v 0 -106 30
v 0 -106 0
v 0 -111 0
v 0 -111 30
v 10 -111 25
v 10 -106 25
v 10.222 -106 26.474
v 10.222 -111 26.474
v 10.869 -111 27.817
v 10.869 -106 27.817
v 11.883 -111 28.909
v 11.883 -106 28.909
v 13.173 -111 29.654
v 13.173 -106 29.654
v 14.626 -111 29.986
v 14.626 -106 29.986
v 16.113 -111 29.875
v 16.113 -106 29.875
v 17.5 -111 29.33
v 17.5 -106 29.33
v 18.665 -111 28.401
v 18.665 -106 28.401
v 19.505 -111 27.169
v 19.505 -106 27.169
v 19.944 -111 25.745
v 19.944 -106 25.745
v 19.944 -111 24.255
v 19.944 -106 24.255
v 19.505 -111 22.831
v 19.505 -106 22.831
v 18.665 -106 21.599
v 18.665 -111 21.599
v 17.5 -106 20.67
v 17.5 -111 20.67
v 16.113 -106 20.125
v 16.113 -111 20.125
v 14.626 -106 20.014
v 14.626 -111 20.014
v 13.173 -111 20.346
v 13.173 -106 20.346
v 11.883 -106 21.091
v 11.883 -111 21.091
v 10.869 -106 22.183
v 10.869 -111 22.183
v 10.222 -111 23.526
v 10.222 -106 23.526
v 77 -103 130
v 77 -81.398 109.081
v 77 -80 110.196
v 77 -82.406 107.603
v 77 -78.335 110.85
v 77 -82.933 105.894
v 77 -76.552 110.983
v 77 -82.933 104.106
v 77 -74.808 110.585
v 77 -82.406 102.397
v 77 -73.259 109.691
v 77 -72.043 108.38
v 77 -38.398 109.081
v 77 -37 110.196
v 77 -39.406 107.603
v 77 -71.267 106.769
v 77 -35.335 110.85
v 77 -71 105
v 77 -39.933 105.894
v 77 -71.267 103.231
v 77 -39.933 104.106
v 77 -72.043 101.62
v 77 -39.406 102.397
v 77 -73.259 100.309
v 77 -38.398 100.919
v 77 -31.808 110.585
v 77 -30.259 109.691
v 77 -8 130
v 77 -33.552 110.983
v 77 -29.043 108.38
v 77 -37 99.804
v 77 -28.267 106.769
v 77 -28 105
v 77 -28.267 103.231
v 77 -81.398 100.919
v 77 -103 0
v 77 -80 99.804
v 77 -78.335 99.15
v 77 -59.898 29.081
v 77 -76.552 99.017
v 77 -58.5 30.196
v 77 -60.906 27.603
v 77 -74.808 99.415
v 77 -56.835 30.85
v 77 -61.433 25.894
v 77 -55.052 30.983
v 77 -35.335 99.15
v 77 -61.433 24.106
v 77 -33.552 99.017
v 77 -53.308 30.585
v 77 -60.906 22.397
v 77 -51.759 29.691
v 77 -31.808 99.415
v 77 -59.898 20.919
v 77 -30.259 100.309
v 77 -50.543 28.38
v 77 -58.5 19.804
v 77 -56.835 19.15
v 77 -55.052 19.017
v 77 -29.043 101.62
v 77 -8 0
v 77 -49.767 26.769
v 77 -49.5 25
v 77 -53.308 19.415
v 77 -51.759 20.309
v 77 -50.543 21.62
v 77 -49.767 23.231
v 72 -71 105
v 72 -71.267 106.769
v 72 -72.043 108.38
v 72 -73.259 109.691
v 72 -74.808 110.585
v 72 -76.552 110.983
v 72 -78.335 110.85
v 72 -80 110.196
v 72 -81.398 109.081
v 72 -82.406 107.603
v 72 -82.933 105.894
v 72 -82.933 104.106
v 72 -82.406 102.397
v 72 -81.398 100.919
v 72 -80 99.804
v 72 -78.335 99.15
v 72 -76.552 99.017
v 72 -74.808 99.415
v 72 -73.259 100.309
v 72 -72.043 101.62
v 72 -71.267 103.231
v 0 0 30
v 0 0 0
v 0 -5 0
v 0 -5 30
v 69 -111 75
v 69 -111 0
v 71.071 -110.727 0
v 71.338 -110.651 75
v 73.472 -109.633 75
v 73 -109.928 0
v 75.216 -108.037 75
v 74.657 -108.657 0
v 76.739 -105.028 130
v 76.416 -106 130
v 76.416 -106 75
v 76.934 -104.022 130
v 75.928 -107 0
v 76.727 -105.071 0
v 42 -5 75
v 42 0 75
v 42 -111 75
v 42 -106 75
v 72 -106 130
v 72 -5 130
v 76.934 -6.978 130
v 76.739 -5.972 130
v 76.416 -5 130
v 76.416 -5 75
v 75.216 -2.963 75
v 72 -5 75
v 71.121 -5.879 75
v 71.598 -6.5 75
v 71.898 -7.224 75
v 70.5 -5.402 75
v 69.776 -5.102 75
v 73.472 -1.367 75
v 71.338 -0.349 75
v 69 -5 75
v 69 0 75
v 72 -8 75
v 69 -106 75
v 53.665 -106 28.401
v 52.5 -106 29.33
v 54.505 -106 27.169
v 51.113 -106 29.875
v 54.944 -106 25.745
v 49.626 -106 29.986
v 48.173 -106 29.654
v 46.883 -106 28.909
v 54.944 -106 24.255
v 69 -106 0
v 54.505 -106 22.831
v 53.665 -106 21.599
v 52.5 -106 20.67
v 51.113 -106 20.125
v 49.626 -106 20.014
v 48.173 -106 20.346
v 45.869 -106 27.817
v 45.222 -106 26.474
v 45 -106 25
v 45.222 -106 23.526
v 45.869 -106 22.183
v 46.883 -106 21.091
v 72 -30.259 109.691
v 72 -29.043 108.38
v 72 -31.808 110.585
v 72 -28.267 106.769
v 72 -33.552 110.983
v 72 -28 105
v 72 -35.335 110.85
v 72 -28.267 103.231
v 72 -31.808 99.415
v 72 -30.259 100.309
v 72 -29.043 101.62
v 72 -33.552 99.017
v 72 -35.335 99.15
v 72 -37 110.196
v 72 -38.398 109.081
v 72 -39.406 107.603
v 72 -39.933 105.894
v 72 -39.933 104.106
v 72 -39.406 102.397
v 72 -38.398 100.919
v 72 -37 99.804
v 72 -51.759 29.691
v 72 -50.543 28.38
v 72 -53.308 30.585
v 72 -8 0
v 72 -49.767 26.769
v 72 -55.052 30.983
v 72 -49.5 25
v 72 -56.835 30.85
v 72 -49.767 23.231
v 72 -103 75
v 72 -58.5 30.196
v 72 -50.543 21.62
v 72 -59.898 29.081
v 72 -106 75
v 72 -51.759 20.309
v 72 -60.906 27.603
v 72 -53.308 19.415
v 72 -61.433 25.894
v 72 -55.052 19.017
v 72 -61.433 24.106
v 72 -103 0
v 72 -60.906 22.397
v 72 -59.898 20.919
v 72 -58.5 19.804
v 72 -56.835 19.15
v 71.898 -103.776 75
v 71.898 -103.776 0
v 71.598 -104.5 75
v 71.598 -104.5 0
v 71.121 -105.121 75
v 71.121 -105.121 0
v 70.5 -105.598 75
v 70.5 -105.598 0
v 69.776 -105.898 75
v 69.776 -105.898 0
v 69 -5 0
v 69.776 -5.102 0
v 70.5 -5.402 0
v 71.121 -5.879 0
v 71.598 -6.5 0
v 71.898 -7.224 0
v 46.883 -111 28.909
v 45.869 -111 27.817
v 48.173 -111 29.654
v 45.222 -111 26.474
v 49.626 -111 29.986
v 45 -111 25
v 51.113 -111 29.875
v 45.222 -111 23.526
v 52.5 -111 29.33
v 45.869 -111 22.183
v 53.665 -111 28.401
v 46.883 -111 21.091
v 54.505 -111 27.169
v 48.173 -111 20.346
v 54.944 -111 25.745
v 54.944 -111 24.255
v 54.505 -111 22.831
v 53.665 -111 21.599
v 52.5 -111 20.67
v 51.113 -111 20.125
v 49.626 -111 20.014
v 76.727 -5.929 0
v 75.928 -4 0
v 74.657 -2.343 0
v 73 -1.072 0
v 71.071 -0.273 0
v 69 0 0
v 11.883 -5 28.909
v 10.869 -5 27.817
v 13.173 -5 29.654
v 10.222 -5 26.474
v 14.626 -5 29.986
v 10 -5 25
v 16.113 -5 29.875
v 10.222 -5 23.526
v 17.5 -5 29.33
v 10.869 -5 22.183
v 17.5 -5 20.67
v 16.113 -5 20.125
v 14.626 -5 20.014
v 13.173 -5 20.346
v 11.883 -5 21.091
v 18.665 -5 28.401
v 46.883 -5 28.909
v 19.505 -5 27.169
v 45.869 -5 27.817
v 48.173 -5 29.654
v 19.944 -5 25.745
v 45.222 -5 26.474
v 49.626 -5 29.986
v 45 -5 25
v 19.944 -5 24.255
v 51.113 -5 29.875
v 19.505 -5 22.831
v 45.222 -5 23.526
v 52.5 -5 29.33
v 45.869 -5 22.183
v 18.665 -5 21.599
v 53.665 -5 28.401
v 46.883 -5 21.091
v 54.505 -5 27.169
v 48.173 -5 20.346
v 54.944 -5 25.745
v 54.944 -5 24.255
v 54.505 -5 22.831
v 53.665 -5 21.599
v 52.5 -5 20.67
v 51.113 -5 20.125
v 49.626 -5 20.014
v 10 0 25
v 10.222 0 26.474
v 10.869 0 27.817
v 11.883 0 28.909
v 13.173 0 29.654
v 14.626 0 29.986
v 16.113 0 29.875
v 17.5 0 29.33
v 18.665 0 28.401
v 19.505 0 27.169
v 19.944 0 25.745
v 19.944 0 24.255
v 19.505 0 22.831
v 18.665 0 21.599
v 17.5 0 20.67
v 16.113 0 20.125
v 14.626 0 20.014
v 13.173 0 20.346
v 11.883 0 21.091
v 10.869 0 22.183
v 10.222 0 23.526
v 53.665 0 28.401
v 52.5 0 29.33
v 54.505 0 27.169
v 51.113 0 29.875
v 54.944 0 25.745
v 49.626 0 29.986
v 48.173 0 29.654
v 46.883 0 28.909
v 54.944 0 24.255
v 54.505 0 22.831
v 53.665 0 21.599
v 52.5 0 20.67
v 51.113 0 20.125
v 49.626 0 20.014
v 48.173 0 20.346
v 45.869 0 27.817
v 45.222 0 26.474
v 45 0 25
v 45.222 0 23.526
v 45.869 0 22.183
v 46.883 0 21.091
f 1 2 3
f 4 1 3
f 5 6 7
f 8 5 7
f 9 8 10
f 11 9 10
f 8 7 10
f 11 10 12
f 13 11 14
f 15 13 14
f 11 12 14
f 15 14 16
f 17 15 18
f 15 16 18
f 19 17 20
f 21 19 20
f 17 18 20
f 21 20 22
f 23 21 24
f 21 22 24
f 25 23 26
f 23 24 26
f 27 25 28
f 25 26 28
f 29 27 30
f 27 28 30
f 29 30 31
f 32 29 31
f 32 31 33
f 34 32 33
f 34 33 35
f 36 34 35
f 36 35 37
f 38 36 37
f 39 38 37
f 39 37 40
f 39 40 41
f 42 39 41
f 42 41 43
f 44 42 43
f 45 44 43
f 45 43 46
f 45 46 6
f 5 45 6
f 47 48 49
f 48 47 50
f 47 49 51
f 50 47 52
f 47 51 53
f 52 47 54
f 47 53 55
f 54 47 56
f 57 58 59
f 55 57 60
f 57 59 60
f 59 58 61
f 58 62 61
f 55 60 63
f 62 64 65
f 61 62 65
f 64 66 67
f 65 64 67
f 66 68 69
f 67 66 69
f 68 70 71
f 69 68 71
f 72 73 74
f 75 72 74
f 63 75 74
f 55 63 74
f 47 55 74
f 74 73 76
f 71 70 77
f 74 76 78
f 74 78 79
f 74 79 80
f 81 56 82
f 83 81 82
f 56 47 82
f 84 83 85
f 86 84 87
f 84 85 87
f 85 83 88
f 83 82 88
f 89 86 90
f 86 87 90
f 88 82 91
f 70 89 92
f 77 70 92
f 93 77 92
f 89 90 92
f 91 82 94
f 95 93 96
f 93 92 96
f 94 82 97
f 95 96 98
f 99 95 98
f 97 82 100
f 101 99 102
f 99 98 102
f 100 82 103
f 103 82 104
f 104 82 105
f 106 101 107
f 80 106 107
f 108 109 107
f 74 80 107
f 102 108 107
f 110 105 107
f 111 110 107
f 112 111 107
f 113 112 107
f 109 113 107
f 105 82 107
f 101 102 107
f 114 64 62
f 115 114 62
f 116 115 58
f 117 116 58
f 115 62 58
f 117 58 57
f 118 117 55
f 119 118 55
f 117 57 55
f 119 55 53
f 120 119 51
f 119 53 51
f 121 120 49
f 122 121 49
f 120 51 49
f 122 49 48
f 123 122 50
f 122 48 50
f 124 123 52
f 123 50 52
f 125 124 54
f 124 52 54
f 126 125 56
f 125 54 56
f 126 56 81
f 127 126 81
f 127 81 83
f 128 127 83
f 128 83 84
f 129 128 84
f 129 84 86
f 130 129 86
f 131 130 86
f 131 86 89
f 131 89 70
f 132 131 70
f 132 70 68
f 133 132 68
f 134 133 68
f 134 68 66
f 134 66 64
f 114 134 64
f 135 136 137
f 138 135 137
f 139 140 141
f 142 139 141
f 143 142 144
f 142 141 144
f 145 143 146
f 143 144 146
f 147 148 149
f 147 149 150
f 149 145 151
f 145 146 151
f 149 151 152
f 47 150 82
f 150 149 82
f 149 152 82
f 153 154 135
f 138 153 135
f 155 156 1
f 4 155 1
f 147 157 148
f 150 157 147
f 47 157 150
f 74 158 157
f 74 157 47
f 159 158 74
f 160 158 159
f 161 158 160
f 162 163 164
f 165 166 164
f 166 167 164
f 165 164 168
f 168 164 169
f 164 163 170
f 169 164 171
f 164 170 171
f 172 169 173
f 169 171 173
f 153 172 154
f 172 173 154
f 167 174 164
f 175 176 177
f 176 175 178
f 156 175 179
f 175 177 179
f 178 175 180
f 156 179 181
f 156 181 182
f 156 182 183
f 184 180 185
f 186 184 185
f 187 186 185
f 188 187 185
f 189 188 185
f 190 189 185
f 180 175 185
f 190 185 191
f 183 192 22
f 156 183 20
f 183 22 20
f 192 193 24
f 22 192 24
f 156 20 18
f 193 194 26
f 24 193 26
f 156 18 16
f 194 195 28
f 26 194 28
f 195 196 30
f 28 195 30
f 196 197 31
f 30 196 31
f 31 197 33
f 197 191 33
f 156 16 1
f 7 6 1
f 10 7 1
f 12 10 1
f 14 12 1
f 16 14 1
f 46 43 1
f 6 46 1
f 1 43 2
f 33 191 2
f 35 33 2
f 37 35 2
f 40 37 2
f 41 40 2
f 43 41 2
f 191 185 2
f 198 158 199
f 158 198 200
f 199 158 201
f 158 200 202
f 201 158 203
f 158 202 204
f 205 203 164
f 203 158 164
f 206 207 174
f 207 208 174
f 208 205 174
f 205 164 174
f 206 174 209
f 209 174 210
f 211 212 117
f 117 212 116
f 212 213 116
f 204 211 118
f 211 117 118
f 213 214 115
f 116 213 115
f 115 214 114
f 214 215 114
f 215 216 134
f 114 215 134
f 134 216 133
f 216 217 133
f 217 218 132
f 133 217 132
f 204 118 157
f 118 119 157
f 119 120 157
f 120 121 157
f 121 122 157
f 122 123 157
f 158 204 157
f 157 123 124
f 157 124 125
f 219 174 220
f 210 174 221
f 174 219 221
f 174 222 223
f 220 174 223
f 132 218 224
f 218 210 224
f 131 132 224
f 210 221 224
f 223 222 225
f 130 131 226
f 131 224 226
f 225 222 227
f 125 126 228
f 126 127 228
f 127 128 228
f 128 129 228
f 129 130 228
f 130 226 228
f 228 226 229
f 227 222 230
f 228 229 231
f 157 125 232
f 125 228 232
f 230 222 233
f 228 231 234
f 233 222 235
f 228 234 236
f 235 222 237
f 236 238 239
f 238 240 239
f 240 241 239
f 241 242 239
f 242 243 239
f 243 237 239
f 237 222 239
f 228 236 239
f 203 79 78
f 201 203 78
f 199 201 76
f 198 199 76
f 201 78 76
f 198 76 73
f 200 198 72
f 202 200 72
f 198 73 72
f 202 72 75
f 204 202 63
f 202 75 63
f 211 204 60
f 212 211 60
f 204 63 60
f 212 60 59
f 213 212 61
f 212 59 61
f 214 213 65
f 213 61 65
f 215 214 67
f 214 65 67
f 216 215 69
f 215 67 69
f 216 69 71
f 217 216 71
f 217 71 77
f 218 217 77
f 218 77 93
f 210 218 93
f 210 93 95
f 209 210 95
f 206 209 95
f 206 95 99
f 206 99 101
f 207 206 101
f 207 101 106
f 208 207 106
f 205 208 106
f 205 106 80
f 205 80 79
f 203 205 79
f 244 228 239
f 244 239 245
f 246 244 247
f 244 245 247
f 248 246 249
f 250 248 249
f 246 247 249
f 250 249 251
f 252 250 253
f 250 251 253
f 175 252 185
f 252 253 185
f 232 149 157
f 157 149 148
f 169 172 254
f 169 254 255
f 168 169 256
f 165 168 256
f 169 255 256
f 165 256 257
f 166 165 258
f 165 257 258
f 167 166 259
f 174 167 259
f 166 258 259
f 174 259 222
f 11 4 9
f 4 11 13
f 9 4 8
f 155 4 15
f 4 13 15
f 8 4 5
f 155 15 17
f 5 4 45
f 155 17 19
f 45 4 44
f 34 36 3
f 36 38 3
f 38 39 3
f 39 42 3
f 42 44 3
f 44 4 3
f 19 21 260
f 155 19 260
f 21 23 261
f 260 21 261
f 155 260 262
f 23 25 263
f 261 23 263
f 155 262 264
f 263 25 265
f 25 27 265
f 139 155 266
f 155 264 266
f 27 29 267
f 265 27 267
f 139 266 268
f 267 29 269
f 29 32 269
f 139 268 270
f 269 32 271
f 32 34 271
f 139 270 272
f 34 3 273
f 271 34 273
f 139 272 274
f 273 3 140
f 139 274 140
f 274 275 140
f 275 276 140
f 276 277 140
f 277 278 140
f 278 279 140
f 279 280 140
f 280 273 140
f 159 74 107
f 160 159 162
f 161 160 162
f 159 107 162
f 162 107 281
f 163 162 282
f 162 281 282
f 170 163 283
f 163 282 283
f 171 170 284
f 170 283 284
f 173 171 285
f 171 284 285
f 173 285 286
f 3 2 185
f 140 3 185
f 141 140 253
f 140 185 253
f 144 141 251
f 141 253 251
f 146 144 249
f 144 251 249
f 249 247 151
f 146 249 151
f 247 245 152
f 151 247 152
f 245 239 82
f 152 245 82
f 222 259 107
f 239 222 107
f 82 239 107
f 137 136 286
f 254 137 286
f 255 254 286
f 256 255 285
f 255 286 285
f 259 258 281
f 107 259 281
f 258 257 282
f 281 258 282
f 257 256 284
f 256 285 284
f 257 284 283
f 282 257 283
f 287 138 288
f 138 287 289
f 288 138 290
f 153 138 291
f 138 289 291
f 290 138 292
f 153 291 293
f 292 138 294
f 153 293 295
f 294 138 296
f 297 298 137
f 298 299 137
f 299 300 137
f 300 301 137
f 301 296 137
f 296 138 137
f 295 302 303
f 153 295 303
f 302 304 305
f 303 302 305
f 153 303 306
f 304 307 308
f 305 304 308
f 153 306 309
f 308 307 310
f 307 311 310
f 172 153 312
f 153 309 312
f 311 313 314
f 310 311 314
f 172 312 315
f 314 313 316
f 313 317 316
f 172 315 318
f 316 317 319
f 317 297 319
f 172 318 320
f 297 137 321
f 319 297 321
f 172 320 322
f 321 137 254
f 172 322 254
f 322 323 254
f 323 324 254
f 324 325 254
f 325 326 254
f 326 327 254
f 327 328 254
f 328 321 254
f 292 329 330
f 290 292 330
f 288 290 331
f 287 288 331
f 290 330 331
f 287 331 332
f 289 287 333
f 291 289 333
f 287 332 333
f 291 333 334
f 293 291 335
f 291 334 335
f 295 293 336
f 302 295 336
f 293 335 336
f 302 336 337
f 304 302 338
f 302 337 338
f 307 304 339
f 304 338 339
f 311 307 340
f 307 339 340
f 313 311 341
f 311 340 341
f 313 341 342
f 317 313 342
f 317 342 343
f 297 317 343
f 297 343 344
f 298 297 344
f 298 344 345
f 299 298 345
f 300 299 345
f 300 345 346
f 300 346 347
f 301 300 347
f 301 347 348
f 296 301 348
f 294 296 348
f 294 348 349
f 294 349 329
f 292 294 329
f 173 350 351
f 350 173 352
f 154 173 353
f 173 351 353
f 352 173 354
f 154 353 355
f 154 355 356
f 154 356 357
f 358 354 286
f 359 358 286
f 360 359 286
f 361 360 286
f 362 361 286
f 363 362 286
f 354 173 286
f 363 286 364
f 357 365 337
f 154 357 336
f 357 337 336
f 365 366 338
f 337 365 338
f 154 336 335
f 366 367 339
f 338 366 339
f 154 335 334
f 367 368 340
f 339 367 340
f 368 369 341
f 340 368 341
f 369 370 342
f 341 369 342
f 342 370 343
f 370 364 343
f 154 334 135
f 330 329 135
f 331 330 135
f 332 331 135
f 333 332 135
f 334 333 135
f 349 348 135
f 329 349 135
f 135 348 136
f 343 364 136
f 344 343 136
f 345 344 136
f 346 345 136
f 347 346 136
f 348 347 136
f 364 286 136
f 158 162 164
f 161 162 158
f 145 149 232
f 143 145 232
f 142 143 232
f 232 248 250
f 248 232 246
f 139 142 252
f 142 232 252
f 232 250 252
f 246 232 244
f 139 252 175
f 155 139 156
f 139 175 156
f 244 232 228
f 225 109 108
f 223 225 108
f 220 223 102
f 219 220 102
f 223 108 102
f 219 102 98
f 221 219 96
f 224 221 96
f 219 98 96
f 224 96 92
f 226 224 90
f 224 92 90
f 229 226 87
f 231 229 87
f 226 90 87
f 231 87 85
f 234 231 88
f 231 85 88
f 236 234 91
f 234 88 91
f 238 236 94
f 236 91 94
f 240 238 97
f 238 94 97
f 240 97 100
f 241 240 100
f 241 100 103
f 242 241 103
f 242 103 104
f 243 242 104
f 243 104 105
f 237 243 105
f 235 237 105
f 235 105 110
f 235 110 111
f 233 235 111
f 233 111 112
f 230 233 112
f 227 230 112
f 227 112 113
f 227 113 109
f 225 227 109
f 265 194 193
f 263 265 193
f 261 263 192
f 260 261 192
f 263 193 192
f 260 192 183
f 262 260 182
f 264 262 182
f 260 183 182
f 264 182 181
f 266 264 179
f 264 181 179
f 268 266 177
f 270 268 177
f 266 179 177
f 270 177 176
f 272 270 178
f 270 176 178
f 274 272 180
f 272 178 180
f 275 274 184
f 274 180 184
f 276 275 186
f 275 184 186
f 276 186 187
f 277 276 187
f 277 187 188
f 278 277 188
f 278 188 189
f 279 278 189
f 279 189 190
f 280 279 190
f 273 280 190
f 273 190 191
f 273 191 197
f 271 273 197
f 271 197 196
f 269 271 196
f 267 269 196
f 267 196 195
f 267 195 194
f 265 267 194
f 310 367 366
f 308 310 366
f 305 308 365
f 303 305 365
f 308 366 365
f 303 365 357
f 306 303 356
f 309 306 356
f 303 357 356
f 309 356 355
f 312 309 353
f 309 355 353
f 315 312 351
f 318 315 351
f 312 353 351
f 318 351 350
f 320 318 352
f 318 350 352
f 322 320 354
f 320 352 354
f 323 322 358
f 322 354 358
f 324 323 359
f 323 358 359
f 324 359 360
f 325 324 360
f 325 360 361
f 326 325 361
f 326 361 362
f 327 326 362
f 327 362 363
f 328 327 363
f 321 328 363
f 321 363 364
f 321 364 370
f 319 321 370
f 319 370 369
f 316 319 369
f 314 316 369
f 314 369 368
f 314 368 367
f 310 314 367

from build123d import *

# Parameters (mm, degrees)
F1_DEPTH  = 130
F4_DEPTH  = 121
F6_DEPTH  = 116
F8_W      = 5
F8_H      = 55
F9_DEPTH  = 37.8
F10_W     = 5
F10_H     = 55
F11_DEPTH = 63
F12_R     = 5
F13_DEPTH = 135
F14_R     = 6
F15_DEPTH = 25


with BuildPart() as f1:
    # F0 (on Top) → F1 (new body)
    with BuildSketch(Plane.XY):
        with BuildLine():
            Line((69, 0), (0, 0))
            Line((0, 0), (0, -5))
            Line((0, -5), (69, -5))
            ThreePointArc((69, -5), (71.1213203436, -5.8786796564), (72, -8))
            Line((72, -8), (72, -103))
            ThreePointArc((72, -103), (71.1213203436, -105.1213203436), (69, -106))
            Line((69, -106), (0, -106))
            Line((0, -106), (0, -111))
            Line((0, -111), (69, -111))
            ThreePointArc((69, -111), (74.6568542495, -108.6568542495), (77, -103))
            Line((77, -103), (77, -8))
            ThreePointArc((77, -8), (74.6568542495, -2.3431457505), (69, 0))
        make_face()
    extrude(amount=F1_DEPTH)

    # F3 (on offset) → F4 (cut)
    with BuildSketch(Plane(origin=(0, 0, 0), x_dir=(-1, 0, 0), z_dir=(0, 1, 0))):
        Polygon((0, 75), (0, 130), (-72, 130), (-72, 75), (-42, 75), align=None)
    extrude(amount=-F4_DEPTH, mode=Mode.SUBTRACT)

    # F5 (on offset) → F6 (cut)
    with BuildSketch(Plane(origin=(0, 0, 0), x_dir=(-1, 0, 0), z_dir=(0, 1, 0))):
        Polygon((0, 30), (0, 75), (-42, 75), align=None)
    extrude(amount=-F6_DEPTH, mode=Mode.SUBTRACT)

    # F8 (on offset) → F9 (cut)
    with BuildSketch(Plane.YZ.offset(77)):
        with Locations((-2.5, 102.5)):
            Rectangle(F8_W, F8_H)
    extrude(amount=-F9_DEPTH, mode=Mode.SUBTRACT)

    # F10 (on offset) → F11 (cut)
    with BuildSketch(Plane.YZ.offset(77)):
        with Locations((-108.5, 102.5)):
            Rectangle(F10_W, F10_H)
    extrude(amount=-F11_DEPTH, mode=Mode.SUBTRACT)

    # F12 (on offset) → F13 (cut)
    with BuildSketch(Plane(origin=(0, 0, 0), x_dir=(-1, 0, 0), z_dir=(0, 1, 0))):
        with Locations((-15, 25)):
            Circle(F12_R)
        with Locations((-50, 25)):
            Circle(F12_R)
    extrude(amount=-F13_DEPTH, mode=Mode.SUBTRACT)

    # F14 (on offset) → F15 (cut)
    with BuildSketch(Plane.YZ.offset(77)):
        with Locations((-55.5, 25)):
            Circle(F14_R)
        with Locations((-77, 105)):
            Circle(F14_R)
        with Locations((-34, 105)):
            Circle(F14_R)
    extrude(amount=-F15_DEPTH, mode=Mode.SUBTRACT)


solid = f1.part
